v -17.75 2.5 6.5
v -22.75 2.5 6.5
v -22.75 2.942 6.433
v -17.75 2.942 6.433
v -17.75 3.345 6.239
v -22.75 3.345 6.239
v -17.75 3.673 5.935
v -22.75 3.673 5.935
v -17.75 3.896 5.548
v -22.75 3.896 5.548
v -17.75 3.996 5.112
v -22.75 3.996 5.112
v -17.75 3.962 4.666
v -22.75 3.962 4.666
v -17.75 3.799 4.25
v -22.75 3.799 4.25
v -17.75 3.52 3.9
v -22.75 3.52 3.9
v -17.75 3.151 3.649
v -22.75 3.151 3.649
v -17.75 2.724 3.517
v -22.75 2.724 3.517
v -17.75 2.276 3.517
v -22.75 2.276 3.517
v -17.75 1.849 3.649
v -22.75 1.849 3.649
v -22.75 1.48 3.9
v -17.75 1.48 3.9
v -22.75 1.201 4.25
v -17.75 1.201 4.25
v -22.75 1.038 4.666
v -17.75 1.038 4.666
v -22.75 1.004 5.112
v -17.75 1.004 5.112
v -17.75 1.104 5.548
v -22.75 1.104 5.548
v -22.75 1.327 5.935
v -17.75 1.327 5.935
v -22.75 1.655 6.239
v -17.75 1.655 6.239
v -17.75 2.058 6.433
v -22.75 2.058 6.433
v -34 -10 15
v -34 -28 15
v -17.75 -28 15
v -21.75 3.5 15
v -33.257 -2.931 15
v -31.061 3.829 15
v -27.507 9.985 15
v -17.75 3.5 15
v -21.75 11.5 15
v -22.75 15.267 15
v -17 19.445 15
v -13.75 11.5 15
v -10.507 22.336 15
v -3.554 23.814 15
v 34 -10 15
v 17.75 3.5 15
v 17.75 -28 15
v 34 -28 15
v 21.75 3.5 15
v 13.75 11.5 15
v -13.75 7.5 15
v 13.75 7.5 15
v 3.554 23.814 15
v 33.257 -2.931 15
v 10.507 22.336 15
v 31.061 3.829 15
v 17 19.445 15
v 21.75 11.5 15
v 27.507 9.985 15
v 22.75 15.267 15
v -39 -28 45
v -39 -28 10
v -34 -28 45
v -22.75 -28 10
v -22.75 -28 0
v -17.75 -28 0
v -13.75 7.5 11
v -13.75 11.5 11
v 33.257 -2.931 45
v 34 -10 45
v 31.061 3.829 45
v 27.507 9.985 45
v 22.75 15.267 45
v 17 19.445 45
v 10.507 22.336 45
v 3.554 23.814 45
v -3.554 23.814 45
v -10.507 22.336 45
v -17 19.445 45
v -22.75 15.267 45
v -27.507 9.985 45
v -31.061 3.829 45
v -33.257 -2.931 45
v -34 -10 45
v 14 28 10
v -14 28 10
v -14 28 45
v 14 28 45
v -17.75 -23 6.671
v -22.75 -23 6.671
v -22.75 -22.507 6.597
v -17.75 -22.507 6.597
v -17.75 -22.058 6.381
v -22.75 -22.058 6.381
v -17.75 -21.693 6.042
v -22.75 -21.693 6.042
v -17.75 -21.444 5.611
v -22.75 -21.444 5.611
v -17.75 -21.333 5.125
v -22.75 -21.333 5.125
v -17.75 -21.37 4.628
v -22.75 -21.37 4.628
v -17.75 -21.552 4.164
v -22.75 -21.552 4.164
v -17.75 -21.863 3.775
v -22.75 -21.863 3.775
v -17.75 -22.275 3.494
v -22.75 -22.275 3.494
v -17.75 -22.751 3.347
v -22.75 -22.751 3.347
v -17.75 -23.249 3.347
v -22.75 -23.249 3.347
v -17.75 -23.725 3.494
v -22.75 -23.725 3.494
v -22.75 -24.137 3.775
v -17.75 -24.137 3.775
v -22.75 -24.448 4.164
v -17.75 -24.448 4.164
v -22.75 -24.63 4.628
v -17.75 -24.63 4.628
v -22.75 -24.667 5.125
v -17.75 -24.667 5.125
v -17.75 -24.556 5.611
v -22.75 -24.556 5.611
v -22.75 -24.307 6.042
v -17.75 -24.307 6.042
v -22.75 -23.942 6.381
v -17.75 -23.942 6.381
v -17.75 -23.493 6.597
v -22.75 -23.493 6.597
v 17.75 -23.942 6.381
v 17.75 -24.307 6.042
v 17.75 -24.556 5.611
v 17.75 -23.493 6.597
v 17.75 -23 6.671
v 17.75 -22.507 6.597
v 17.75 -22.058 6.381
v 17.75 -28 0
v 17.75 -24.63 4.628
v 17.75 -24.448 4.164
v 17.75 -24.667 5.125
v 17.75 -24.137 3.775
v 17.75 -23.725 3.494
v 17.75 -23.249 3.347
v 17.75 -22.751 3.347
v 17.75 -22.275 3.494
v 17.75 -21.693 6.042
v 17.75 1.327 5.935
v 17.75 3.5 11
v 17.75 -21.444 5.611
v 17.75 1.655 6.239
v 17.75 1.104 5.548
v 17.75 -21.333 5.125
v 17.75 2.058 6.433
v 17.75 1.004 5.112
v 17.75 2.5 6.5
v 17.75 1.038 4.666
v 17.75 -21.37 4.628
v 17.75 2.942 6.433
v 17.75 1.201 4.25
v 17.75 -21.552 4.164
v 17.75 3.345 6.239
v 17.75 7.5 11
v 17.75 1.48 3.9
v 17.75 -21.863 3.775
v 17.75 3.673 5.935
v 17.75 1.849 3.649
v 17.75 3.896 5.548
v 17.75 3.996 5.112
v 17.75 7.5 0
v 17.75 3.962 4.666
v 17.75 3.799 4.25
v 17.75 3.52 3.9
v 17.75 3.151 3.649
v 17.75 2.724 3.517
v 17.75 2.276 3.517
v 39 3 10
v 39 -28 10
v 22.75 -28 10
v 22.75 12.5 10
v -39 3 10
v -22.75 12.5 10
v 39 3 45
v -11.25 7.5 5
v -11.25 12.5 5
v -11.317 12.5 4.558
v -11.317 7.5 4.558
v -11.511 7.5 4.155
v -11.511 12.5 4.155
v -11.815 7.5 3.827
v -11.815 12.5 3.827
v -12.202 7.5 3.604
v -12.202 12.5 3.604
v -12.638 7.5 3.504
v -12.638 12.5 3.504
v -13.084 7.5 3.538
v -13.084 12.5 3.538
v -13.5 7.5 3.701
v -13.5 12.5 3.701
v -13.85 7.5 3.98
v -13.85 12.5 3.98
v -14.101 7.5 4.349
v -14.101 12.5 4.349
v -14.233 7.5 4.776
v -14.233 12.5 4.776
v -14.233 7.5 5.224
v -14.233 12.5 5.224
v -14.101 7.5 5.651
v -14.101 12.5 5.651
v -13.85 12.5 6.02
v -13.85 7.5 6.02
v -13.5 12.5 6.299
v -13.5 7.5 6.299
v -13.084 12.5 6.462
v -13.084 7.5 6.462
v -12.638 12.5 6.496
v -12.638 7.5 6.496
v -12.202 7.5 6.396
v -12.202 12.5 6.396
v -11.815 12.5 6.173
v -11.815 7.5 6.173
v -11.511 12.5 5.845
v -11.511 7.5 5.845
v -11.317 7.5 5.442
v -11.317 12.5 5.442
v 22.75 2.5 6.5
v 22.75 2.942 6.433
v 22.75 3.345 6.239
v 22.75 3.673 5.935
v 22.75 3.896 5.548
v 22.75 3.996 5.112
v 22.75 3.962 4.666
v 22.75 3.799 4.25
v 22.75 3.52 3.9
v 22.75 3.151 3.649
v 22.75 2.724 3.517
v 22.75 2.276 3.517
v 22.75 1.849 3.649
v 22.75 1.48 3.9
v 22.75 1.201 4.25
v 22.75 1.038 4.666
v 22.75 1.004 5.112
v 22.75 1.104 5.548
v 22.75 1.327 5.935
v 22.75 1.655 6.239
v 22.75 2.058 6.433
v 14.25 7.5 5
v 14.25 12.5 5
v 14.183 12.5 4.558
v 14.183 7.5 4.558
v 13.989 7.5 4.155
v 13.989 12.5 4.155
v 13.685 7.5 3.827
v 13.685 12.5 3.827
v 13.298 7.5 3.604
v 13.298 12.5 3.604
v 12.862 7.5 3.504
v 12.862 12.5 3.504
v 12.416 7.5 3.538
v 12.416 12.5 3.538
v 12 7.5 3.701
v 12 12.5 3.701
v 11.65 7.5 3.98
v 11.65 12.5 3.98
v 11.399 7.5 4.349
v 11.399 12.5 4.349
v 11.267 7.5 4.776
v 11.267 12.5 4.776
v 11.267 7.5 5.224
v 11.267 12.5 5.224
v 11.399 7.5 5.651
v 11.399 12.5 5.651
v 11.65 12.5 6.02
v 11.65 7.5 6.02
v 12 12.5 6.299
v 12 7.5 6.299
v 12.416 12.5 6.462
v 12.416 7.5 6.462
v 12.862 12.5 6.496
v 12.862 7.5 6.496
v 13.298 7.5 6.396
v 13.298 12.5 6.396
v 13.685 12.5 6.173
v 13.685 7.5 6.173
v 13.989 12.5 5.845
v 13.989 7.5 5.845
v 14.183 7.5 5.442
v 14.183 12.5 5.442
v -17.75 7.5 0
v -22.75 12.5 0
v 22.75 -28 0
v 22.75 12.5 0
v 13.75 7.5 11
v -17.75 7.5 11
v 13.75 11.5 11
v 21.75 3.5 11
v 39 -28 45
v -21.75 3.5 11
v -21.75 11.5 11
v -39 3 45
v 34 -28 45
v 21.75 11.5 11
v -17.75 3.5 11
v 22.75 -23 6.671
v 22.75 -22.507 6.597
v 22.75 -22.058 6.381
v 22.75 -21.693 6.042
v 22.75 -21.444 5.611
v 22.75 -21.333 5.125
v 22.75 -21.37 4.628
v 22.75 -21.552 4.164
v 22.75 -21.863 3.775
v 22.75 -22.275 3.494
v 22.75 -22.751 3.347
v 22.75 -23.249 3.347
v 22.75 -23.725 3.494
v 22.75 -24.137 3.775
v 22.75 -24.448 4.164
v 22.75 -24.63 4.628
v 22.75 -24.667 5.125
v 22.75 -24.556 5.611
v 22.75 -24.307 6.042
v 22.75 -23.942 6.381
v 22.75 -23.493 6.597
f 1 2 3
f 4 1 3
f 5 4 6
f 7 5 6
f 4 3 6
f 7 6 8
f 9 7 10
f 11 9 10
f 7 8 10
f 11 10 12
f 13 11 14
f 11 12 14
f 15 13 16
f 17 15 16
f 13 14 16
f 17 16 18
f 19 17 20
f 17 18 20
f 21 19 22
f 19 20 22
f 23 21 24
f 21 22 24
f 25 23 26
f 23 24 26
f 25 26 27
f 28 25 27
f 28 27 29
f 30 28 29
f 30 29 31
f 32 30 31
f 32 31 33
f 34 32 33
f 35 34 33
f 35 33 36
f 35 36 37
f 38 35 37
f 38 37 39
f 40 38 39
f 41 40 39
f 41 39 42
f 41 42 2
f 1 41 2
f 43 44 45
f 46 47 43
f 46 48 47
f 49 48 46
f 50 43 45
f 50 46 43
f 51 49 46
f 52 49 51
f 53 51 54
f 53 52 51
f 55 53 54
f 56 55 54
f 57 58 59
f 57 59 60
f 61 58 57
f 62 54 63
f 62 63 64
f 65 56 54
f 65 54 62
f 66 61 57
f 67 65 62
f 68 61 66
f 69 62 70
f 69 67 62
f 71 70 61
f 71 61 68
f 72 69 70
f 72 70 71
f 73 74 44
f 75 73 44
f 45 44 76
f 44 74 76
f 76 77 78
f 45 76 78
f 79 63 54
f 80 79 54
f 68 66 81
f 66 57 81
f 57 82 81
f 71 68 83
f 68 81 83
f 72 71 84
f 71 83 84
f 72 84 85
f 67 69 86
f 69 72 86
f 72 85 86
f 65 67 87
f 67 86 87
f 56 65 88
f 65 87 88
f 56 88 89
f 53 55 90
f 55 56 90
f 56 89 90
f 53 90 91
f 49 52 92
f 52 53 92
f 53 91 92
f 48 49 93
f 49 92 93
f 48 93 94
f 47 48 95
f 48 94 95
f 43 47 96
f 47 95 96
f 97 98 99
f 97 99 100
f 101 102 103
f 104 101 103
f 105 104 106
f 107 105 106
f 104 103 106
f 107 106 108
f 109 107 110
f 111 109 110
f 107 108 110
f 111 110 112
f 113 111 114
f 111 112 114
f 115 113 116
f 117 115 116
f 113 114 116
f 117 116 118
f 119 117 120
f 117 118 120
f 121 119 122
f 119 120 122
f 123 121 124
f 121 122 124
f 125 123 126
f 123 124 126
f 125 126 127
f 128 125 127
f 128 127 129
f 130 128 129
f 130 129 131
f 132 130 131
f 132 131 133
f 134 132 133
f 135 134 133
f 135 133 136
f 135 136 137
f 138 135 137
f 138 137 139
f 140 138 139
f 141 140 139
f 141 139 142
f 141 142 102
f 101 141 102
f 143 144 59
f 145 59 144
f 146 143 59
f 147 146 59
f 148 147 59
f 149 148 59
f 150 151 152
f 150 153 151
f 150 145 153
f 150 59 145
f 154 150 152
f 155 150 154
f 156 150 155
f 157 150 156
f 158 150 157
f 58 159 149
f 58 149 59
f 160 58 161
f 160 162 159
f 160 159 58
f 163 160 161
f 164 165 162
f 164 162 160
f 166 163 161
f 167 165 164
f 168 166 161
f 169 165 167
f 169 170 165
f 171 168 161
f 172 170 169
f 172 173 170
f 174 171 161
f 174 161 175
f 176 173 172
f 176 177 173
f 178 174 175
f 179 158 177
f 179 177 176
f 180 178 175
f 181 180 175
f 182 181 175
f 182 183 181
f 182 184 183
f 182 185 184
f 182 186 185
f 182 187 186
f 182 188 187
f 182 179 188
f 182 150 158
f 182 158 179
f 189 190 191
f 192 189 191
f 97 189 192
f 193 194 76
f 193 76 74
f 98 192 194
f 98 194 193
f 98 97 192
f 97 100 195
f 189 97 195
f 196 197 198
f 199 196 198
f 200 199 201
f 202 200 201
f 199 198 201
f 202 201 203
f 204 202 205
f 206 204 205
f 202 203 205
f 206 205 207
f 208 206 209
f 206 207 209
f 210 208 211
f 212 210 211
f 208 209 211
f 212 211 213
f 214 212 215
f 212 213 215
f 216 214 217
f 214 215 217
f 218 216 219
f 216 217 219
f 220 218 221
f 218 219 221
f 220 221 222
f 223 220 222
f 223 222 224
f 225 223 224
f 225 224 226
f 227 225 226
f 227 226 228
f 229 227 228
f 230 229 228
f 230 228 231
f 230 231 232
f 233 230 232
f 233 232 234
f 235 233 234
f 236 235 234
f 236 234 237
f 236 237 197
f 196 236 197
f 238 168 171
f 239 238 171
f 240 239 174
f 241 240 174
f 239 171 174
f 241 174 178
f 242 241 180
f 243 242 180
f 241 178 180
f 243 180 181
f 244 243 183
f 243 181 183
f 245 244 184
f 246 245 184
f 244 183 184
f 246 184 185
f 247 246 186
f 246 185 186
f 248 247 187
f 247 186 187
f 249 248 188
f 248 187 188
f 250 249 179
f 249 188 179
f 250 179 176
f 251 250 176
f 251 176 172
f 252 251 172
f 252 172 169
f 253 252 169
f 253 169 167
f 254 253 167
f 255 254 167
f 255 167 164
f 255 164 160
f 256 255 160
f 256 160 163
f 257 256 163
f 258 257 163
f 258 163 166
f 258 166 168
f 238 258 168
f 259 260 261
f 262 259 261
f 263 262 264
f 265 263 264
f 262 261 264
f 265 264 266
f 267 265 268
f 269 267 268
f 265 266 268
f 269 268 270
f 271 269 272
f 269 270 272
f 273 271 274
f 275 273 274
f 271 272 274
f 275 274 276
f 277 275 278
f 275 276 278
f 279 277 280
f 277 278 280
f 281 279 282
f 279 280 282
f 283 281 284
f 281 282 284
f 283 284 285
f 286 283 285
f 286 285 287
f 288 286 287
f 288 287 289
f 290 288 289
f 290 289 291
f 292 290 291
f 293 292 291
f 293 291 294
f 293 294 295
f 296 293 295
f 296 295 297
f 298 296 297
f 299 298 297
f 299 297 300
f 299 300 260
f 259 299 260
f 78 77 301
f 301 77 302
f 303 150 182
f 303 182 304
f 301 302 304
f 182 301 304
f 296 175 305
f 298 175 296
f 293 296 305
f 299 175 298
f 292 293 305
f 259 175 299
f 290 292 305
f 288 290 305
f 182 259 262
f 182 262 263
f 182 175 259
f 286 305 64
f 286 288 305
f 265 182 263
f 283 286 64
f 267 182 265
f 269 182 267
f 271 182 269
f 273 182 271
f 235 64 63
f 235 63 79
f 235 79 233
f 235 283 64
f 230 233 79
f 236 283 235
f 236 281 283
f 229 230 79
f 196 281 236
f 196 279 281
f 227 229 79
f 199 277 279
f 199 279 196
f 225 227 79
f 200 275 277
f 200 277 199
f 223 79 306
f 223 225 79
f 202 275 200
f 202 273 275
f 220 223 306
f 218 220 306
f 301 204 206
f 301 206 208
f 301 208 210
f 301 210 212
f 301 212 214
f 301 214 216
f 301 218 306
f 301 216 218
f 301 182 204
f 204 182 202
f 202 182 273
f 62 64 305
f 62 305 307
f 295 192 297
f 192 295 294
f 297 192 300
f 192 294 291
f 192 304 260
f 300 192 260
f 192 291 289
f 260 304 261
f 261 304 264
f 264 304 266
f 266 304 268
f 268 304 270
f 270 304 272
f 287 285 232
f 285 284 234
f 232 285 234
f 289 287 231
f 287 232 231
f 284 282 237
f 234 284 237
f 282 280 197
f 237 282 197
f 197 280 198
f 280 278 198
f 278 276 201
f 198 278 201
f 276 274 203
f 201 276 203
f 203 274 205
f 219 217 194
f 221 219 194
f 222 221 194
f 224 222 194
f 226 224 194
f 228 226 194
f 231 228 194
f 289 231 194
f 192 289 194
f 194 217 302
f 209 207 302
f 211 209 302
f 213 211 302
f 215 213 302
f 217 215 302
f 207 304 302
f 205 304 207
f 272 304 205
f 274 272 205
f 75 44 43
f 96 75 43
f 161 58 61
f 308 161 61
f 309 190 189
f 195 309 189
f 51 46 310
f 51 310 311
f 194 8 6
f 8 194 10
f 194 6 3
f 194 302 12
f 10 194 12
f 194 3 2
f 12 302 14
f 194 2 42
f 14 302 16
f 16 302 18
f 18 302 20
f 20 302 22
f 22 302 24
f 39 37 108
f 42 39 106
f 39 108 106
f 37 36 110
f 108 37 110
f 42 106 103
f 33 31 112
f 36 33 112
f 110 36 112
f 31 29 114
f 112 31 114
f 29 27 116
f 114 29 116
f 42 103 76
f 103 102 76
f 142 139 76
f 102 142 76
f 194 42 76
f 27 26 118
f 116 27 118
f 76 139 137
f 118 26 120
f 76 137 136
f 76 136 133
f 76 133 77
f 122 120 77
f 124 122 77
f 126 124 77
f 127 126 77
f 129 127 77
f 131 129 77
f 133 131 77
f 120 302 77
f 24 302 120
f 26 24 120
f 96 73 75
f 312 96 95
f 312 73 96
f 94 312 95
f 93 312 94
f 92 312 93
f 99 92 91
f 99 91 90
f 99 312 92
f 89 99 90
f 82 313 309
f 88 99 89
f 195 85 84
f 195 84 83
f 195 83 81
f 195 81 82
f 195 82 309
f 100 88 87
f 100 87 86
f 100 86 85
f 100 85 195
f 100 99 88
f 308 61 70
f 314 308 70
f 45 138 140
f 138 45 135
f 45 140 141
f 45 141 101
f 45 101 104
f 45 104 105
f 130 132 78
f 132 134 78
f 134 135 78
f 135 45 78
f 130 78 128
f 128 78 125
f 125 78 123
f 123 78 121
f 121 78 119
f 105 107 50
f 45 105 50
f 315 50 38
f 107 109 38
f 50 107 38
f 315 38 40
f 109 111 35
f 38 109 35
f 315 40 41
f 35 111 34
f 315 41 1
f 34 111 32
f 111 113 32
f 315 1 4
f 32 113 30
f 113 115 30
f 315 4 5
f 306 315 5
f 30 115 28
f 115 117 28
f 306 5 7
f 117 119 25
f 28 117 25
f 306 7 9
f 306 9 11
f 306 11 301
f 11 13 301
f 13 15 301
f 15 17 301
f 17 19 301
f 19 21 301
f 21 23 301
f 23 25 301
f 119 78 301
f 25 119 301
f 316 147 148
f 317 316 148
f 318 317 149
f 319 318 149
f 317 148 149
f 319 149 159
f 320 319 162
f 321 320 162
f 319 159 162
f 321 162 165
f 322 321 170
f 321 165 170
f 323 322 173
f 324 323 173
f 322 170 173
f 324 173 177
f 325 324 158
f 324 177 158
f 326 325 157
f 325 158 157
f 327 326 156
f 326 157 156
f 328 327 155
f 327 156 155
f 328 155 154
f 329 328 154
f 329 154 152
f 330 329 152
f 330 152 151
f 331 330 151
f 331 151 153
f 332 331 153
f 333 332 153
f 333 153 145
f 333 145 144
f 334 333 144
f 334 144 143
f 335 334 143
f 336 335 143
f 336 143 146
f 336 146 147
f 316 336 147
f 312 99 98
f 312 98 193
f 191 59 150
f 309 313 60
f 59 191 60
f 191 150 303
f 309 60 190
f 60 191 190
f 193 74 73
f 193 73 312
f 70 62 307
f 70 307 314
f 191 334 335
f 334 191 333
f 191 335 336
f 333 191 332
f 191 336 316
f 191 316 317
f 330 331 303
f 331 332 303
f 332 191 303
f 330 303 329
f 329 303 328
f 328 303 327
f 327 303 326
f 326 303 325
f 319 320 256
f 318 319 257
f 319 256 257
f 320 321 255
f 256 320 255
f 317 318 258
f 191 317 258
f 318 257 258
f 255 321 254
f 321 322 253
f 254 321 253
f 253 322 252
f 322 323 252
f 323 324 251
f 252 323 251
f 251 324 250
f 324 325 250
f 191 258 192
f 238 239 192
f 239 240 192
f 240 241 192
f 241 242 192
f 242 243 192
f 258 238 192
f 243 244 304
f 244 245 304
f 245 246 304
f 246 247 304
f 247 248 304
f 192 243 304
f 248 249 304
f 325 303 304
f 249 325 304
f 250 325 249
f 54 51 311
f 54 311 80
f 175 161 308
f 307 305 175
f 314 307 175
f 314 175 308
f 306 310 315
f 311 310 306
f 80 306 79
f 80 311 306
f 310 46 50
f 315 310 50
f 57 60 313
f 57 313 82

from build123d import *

# Parameters (mm, degrees)
ESQUISSE3_W              = 78
ESQUISSE3_H              = 56
BOSS_EXTRU_2_DEPTH       = 45
ESQUISSE4_R              = 34
ENL_V_MAT_EXTRU_1_DEPTH  = 30
ESQUISSE5_W              = 35.5
ESQUISSE5_H              = 35.5
ENL_V_MAT_EXTRU_2_DEPTH  = 15
ENL_V_MAT_EXTRU_5_DEPTH  = 10
ESQUISSE12_W             = 68
ESQUISSE12_H             = 18
ENL_V_MAT_EXTRU_6_DEPTH  = 30
ESQUISSE13_R             = 1.671466639
ENL_V_MAT_EXTRU_7_DEPTH  = 62.75
ESQUISSE15_R             = 1.5
ENL_V_MAT_EXTRU_8_DEPTH  = 62.75
ESQUISSE16_W             = 8
ESQUISSE16_H             = 8
ENL_V_MAT_EXTRU_9_DEPTH  = 4
ESQUISSE17_R             = 1.5
ENL_V_MAT_EXTRU_10_DEPTH = 41.5
ESQUISSE18_R             = 1.5
ENL_V_MAT_EXTRU_11_DEPTH = 41.5
ESQUISSE19_W             = 8
ESQUISSE19_H             = 8
ENL_V_MAT_EXTRU_12_DEPTH = 4
ENL_V_MAT_EXTRU_13_DEPTH = 46


with BuildPart() as part:
    # Esquisse3 → Boss.-Extru.2 (new body)
    with BuildSketch(Plane.XY):
        Rectangle(ESQUISSE3_W, ESQUISSE3_H)
    extrude(amount=BOSS_EXTRU_2_DEPTH)

    # Esquisse4 → Enlèv. mat.-Extru.1 (cut)
    with BuildSketch(Plane.XY.offset(45)):
        with Locations((0, -10)):
            Circle(ESQUISSE4_R)
    extrude(amount=-ENL_V_MAT_EXTRU_1_DEPTH, mode=Mode.SUBTRACT)

    # Esquisse5 → Enlèv. mat.-Extru.2 (cut)
    with BuildSketch(Plane(origin=(0, 0, 0), x_dir=(-1, 0, 0), z_dir=(0, 0, -1))):
        with Locations((0, -10.25)):
            Rectangle(ESQUISSE5_W, ESQUISSE5_H)
    extrude(amount=-ENL_V_MAT_EXTRU_2_DEPTH, mode=Mode.SUBTRACT)

    # Esquisse8 → Enlèv. mat.-Extru.5 (cut)
    with BuildSketch(Plane(origin=(0, 0, 0), x_dir=(-1, 0, 0), z_dir=(0, 0, -1))):
        Polygon((-22.75, -28), (-22.75, 12.5), (22.75, 12.5), (22.75, -28), (39, -28), (39, 28), (-39, 28), (-39, -28), align=None)
    extrude(amount=-ENL_V_MAT_EXTRU_5_DEPTH, mode=Mode.SUBTRACT)

    # Esquisse12 → Enlèv. mat.-Extru.6 (cut)
    with BuildSketch(Plane.XY.offset(45)):
        with Locations((0, -19)):
            Rectangle(ESQUISSE12_W, ESQUISSE12_H)
    extrude(amount=-ENL_V_MAT_EXTRU_6_DEPTH, mode=Mode.SUBTRACT)

    # Esquisse13 → Enlèv. mat.-Extru.7 (cut, through all)
    with BuildSketch(Plane.ZY.offset(22.75)):
        with Locations((5, -23)):
            Circle(ESQUISSE13_R)
    extrude(amount=-ENL_V_MAT_EXTRU_7_DEPTH, mode=Mode.SUBTRACT)

    # Esquisse15 → Enlèv. mat.-Extru.8 (cut, through all)
    with BuildSketch(Plane.ZY.offset(22.75)):
        with Locations((5, 2.5)):
            Circle(ESQUISSE15_R)
    extrude(amount=-ENL_V_MAT_EXTRU_8_DEPTH, mode=Mode.SUBTRACT)

    # Esquisse16 → Enlèv. mat.-Extru.9 (cut)
    with BuildSketch(Plane.XY.offset(15)):
        with Locations((-17.75, 7.5)):
            Rectangle(ESQUISSE16_W, ESQUISSE16_H)
    extrude(amount=-ENL_V_MAT_EXTRU_9_DEPTH, mode=Mode.SUBTRACT)

    # Esquisse17 → Enlèv. mat.-Extru.10 (cut, through all)
    with BuildSketch(Plane(origin=(0, 12.5, 0), x_dir=(1, 0, 0), z_dir=(0, 1, 0))):
        with Locations((-12.75, -5)):
            Circle(ESQUISSE17_R)
    extrude(amount=-ENL_V_MAT_EXTRU_10_DEPTH, mode=Mode.SUBTRACT)

    # Esquisse18 → Enlèv. mat.-Extru.11 (cut, through all)
    with BuildSketch(Plane(origin=(0, 12.5, 0), x_dir=(1, 0, 0), z_dir=(0, 1, 0))):
        with Locations((12.75, -5)):
            Circle(ESQUISSE18_R)
    extrude(amount=-ENL_V_MAT_EXTRU_11_DEPTH, mode=Mode.SUBTRACT)

    # Esquisse19 → Enlèv. mat.-Extru.12 (cut)
    with BuildSketch(Plane.XY.offset(15)):
        with Locations((17.75, 7.5)):
            Rectangle(ESQUISSE19_W, ESQUISSE19_H)
    extrude(amount=-ENL_V_MAT_EXTRU_12_DEPTH, mode=Mode.SUBTRACT)

    # Esquisse20 → Enlèv. mat.-Extru.13 (cut, through all)
    with BuildSketch(Plane.XY.offset(45)):
        Polygon((-39, 3), (-39, 28), (-14, 28), align=None)
    enl_v_mat_extru_13 = extrude(amount=-ENL_V_MAT_EXTRU_13_DEPTH, mode=Mode.SUBTRACT)

    # Symétrie1: Enlèv. mat.-Extru.13 across plane
    add(enl_v_mat_extru_13.mirror(Plane(origin=(0, 0, 0), x_dir=(0, 0, 1), z_dir=(1, 0, 0))), mode=Mode.SUBTRACT)


solid = part.part
